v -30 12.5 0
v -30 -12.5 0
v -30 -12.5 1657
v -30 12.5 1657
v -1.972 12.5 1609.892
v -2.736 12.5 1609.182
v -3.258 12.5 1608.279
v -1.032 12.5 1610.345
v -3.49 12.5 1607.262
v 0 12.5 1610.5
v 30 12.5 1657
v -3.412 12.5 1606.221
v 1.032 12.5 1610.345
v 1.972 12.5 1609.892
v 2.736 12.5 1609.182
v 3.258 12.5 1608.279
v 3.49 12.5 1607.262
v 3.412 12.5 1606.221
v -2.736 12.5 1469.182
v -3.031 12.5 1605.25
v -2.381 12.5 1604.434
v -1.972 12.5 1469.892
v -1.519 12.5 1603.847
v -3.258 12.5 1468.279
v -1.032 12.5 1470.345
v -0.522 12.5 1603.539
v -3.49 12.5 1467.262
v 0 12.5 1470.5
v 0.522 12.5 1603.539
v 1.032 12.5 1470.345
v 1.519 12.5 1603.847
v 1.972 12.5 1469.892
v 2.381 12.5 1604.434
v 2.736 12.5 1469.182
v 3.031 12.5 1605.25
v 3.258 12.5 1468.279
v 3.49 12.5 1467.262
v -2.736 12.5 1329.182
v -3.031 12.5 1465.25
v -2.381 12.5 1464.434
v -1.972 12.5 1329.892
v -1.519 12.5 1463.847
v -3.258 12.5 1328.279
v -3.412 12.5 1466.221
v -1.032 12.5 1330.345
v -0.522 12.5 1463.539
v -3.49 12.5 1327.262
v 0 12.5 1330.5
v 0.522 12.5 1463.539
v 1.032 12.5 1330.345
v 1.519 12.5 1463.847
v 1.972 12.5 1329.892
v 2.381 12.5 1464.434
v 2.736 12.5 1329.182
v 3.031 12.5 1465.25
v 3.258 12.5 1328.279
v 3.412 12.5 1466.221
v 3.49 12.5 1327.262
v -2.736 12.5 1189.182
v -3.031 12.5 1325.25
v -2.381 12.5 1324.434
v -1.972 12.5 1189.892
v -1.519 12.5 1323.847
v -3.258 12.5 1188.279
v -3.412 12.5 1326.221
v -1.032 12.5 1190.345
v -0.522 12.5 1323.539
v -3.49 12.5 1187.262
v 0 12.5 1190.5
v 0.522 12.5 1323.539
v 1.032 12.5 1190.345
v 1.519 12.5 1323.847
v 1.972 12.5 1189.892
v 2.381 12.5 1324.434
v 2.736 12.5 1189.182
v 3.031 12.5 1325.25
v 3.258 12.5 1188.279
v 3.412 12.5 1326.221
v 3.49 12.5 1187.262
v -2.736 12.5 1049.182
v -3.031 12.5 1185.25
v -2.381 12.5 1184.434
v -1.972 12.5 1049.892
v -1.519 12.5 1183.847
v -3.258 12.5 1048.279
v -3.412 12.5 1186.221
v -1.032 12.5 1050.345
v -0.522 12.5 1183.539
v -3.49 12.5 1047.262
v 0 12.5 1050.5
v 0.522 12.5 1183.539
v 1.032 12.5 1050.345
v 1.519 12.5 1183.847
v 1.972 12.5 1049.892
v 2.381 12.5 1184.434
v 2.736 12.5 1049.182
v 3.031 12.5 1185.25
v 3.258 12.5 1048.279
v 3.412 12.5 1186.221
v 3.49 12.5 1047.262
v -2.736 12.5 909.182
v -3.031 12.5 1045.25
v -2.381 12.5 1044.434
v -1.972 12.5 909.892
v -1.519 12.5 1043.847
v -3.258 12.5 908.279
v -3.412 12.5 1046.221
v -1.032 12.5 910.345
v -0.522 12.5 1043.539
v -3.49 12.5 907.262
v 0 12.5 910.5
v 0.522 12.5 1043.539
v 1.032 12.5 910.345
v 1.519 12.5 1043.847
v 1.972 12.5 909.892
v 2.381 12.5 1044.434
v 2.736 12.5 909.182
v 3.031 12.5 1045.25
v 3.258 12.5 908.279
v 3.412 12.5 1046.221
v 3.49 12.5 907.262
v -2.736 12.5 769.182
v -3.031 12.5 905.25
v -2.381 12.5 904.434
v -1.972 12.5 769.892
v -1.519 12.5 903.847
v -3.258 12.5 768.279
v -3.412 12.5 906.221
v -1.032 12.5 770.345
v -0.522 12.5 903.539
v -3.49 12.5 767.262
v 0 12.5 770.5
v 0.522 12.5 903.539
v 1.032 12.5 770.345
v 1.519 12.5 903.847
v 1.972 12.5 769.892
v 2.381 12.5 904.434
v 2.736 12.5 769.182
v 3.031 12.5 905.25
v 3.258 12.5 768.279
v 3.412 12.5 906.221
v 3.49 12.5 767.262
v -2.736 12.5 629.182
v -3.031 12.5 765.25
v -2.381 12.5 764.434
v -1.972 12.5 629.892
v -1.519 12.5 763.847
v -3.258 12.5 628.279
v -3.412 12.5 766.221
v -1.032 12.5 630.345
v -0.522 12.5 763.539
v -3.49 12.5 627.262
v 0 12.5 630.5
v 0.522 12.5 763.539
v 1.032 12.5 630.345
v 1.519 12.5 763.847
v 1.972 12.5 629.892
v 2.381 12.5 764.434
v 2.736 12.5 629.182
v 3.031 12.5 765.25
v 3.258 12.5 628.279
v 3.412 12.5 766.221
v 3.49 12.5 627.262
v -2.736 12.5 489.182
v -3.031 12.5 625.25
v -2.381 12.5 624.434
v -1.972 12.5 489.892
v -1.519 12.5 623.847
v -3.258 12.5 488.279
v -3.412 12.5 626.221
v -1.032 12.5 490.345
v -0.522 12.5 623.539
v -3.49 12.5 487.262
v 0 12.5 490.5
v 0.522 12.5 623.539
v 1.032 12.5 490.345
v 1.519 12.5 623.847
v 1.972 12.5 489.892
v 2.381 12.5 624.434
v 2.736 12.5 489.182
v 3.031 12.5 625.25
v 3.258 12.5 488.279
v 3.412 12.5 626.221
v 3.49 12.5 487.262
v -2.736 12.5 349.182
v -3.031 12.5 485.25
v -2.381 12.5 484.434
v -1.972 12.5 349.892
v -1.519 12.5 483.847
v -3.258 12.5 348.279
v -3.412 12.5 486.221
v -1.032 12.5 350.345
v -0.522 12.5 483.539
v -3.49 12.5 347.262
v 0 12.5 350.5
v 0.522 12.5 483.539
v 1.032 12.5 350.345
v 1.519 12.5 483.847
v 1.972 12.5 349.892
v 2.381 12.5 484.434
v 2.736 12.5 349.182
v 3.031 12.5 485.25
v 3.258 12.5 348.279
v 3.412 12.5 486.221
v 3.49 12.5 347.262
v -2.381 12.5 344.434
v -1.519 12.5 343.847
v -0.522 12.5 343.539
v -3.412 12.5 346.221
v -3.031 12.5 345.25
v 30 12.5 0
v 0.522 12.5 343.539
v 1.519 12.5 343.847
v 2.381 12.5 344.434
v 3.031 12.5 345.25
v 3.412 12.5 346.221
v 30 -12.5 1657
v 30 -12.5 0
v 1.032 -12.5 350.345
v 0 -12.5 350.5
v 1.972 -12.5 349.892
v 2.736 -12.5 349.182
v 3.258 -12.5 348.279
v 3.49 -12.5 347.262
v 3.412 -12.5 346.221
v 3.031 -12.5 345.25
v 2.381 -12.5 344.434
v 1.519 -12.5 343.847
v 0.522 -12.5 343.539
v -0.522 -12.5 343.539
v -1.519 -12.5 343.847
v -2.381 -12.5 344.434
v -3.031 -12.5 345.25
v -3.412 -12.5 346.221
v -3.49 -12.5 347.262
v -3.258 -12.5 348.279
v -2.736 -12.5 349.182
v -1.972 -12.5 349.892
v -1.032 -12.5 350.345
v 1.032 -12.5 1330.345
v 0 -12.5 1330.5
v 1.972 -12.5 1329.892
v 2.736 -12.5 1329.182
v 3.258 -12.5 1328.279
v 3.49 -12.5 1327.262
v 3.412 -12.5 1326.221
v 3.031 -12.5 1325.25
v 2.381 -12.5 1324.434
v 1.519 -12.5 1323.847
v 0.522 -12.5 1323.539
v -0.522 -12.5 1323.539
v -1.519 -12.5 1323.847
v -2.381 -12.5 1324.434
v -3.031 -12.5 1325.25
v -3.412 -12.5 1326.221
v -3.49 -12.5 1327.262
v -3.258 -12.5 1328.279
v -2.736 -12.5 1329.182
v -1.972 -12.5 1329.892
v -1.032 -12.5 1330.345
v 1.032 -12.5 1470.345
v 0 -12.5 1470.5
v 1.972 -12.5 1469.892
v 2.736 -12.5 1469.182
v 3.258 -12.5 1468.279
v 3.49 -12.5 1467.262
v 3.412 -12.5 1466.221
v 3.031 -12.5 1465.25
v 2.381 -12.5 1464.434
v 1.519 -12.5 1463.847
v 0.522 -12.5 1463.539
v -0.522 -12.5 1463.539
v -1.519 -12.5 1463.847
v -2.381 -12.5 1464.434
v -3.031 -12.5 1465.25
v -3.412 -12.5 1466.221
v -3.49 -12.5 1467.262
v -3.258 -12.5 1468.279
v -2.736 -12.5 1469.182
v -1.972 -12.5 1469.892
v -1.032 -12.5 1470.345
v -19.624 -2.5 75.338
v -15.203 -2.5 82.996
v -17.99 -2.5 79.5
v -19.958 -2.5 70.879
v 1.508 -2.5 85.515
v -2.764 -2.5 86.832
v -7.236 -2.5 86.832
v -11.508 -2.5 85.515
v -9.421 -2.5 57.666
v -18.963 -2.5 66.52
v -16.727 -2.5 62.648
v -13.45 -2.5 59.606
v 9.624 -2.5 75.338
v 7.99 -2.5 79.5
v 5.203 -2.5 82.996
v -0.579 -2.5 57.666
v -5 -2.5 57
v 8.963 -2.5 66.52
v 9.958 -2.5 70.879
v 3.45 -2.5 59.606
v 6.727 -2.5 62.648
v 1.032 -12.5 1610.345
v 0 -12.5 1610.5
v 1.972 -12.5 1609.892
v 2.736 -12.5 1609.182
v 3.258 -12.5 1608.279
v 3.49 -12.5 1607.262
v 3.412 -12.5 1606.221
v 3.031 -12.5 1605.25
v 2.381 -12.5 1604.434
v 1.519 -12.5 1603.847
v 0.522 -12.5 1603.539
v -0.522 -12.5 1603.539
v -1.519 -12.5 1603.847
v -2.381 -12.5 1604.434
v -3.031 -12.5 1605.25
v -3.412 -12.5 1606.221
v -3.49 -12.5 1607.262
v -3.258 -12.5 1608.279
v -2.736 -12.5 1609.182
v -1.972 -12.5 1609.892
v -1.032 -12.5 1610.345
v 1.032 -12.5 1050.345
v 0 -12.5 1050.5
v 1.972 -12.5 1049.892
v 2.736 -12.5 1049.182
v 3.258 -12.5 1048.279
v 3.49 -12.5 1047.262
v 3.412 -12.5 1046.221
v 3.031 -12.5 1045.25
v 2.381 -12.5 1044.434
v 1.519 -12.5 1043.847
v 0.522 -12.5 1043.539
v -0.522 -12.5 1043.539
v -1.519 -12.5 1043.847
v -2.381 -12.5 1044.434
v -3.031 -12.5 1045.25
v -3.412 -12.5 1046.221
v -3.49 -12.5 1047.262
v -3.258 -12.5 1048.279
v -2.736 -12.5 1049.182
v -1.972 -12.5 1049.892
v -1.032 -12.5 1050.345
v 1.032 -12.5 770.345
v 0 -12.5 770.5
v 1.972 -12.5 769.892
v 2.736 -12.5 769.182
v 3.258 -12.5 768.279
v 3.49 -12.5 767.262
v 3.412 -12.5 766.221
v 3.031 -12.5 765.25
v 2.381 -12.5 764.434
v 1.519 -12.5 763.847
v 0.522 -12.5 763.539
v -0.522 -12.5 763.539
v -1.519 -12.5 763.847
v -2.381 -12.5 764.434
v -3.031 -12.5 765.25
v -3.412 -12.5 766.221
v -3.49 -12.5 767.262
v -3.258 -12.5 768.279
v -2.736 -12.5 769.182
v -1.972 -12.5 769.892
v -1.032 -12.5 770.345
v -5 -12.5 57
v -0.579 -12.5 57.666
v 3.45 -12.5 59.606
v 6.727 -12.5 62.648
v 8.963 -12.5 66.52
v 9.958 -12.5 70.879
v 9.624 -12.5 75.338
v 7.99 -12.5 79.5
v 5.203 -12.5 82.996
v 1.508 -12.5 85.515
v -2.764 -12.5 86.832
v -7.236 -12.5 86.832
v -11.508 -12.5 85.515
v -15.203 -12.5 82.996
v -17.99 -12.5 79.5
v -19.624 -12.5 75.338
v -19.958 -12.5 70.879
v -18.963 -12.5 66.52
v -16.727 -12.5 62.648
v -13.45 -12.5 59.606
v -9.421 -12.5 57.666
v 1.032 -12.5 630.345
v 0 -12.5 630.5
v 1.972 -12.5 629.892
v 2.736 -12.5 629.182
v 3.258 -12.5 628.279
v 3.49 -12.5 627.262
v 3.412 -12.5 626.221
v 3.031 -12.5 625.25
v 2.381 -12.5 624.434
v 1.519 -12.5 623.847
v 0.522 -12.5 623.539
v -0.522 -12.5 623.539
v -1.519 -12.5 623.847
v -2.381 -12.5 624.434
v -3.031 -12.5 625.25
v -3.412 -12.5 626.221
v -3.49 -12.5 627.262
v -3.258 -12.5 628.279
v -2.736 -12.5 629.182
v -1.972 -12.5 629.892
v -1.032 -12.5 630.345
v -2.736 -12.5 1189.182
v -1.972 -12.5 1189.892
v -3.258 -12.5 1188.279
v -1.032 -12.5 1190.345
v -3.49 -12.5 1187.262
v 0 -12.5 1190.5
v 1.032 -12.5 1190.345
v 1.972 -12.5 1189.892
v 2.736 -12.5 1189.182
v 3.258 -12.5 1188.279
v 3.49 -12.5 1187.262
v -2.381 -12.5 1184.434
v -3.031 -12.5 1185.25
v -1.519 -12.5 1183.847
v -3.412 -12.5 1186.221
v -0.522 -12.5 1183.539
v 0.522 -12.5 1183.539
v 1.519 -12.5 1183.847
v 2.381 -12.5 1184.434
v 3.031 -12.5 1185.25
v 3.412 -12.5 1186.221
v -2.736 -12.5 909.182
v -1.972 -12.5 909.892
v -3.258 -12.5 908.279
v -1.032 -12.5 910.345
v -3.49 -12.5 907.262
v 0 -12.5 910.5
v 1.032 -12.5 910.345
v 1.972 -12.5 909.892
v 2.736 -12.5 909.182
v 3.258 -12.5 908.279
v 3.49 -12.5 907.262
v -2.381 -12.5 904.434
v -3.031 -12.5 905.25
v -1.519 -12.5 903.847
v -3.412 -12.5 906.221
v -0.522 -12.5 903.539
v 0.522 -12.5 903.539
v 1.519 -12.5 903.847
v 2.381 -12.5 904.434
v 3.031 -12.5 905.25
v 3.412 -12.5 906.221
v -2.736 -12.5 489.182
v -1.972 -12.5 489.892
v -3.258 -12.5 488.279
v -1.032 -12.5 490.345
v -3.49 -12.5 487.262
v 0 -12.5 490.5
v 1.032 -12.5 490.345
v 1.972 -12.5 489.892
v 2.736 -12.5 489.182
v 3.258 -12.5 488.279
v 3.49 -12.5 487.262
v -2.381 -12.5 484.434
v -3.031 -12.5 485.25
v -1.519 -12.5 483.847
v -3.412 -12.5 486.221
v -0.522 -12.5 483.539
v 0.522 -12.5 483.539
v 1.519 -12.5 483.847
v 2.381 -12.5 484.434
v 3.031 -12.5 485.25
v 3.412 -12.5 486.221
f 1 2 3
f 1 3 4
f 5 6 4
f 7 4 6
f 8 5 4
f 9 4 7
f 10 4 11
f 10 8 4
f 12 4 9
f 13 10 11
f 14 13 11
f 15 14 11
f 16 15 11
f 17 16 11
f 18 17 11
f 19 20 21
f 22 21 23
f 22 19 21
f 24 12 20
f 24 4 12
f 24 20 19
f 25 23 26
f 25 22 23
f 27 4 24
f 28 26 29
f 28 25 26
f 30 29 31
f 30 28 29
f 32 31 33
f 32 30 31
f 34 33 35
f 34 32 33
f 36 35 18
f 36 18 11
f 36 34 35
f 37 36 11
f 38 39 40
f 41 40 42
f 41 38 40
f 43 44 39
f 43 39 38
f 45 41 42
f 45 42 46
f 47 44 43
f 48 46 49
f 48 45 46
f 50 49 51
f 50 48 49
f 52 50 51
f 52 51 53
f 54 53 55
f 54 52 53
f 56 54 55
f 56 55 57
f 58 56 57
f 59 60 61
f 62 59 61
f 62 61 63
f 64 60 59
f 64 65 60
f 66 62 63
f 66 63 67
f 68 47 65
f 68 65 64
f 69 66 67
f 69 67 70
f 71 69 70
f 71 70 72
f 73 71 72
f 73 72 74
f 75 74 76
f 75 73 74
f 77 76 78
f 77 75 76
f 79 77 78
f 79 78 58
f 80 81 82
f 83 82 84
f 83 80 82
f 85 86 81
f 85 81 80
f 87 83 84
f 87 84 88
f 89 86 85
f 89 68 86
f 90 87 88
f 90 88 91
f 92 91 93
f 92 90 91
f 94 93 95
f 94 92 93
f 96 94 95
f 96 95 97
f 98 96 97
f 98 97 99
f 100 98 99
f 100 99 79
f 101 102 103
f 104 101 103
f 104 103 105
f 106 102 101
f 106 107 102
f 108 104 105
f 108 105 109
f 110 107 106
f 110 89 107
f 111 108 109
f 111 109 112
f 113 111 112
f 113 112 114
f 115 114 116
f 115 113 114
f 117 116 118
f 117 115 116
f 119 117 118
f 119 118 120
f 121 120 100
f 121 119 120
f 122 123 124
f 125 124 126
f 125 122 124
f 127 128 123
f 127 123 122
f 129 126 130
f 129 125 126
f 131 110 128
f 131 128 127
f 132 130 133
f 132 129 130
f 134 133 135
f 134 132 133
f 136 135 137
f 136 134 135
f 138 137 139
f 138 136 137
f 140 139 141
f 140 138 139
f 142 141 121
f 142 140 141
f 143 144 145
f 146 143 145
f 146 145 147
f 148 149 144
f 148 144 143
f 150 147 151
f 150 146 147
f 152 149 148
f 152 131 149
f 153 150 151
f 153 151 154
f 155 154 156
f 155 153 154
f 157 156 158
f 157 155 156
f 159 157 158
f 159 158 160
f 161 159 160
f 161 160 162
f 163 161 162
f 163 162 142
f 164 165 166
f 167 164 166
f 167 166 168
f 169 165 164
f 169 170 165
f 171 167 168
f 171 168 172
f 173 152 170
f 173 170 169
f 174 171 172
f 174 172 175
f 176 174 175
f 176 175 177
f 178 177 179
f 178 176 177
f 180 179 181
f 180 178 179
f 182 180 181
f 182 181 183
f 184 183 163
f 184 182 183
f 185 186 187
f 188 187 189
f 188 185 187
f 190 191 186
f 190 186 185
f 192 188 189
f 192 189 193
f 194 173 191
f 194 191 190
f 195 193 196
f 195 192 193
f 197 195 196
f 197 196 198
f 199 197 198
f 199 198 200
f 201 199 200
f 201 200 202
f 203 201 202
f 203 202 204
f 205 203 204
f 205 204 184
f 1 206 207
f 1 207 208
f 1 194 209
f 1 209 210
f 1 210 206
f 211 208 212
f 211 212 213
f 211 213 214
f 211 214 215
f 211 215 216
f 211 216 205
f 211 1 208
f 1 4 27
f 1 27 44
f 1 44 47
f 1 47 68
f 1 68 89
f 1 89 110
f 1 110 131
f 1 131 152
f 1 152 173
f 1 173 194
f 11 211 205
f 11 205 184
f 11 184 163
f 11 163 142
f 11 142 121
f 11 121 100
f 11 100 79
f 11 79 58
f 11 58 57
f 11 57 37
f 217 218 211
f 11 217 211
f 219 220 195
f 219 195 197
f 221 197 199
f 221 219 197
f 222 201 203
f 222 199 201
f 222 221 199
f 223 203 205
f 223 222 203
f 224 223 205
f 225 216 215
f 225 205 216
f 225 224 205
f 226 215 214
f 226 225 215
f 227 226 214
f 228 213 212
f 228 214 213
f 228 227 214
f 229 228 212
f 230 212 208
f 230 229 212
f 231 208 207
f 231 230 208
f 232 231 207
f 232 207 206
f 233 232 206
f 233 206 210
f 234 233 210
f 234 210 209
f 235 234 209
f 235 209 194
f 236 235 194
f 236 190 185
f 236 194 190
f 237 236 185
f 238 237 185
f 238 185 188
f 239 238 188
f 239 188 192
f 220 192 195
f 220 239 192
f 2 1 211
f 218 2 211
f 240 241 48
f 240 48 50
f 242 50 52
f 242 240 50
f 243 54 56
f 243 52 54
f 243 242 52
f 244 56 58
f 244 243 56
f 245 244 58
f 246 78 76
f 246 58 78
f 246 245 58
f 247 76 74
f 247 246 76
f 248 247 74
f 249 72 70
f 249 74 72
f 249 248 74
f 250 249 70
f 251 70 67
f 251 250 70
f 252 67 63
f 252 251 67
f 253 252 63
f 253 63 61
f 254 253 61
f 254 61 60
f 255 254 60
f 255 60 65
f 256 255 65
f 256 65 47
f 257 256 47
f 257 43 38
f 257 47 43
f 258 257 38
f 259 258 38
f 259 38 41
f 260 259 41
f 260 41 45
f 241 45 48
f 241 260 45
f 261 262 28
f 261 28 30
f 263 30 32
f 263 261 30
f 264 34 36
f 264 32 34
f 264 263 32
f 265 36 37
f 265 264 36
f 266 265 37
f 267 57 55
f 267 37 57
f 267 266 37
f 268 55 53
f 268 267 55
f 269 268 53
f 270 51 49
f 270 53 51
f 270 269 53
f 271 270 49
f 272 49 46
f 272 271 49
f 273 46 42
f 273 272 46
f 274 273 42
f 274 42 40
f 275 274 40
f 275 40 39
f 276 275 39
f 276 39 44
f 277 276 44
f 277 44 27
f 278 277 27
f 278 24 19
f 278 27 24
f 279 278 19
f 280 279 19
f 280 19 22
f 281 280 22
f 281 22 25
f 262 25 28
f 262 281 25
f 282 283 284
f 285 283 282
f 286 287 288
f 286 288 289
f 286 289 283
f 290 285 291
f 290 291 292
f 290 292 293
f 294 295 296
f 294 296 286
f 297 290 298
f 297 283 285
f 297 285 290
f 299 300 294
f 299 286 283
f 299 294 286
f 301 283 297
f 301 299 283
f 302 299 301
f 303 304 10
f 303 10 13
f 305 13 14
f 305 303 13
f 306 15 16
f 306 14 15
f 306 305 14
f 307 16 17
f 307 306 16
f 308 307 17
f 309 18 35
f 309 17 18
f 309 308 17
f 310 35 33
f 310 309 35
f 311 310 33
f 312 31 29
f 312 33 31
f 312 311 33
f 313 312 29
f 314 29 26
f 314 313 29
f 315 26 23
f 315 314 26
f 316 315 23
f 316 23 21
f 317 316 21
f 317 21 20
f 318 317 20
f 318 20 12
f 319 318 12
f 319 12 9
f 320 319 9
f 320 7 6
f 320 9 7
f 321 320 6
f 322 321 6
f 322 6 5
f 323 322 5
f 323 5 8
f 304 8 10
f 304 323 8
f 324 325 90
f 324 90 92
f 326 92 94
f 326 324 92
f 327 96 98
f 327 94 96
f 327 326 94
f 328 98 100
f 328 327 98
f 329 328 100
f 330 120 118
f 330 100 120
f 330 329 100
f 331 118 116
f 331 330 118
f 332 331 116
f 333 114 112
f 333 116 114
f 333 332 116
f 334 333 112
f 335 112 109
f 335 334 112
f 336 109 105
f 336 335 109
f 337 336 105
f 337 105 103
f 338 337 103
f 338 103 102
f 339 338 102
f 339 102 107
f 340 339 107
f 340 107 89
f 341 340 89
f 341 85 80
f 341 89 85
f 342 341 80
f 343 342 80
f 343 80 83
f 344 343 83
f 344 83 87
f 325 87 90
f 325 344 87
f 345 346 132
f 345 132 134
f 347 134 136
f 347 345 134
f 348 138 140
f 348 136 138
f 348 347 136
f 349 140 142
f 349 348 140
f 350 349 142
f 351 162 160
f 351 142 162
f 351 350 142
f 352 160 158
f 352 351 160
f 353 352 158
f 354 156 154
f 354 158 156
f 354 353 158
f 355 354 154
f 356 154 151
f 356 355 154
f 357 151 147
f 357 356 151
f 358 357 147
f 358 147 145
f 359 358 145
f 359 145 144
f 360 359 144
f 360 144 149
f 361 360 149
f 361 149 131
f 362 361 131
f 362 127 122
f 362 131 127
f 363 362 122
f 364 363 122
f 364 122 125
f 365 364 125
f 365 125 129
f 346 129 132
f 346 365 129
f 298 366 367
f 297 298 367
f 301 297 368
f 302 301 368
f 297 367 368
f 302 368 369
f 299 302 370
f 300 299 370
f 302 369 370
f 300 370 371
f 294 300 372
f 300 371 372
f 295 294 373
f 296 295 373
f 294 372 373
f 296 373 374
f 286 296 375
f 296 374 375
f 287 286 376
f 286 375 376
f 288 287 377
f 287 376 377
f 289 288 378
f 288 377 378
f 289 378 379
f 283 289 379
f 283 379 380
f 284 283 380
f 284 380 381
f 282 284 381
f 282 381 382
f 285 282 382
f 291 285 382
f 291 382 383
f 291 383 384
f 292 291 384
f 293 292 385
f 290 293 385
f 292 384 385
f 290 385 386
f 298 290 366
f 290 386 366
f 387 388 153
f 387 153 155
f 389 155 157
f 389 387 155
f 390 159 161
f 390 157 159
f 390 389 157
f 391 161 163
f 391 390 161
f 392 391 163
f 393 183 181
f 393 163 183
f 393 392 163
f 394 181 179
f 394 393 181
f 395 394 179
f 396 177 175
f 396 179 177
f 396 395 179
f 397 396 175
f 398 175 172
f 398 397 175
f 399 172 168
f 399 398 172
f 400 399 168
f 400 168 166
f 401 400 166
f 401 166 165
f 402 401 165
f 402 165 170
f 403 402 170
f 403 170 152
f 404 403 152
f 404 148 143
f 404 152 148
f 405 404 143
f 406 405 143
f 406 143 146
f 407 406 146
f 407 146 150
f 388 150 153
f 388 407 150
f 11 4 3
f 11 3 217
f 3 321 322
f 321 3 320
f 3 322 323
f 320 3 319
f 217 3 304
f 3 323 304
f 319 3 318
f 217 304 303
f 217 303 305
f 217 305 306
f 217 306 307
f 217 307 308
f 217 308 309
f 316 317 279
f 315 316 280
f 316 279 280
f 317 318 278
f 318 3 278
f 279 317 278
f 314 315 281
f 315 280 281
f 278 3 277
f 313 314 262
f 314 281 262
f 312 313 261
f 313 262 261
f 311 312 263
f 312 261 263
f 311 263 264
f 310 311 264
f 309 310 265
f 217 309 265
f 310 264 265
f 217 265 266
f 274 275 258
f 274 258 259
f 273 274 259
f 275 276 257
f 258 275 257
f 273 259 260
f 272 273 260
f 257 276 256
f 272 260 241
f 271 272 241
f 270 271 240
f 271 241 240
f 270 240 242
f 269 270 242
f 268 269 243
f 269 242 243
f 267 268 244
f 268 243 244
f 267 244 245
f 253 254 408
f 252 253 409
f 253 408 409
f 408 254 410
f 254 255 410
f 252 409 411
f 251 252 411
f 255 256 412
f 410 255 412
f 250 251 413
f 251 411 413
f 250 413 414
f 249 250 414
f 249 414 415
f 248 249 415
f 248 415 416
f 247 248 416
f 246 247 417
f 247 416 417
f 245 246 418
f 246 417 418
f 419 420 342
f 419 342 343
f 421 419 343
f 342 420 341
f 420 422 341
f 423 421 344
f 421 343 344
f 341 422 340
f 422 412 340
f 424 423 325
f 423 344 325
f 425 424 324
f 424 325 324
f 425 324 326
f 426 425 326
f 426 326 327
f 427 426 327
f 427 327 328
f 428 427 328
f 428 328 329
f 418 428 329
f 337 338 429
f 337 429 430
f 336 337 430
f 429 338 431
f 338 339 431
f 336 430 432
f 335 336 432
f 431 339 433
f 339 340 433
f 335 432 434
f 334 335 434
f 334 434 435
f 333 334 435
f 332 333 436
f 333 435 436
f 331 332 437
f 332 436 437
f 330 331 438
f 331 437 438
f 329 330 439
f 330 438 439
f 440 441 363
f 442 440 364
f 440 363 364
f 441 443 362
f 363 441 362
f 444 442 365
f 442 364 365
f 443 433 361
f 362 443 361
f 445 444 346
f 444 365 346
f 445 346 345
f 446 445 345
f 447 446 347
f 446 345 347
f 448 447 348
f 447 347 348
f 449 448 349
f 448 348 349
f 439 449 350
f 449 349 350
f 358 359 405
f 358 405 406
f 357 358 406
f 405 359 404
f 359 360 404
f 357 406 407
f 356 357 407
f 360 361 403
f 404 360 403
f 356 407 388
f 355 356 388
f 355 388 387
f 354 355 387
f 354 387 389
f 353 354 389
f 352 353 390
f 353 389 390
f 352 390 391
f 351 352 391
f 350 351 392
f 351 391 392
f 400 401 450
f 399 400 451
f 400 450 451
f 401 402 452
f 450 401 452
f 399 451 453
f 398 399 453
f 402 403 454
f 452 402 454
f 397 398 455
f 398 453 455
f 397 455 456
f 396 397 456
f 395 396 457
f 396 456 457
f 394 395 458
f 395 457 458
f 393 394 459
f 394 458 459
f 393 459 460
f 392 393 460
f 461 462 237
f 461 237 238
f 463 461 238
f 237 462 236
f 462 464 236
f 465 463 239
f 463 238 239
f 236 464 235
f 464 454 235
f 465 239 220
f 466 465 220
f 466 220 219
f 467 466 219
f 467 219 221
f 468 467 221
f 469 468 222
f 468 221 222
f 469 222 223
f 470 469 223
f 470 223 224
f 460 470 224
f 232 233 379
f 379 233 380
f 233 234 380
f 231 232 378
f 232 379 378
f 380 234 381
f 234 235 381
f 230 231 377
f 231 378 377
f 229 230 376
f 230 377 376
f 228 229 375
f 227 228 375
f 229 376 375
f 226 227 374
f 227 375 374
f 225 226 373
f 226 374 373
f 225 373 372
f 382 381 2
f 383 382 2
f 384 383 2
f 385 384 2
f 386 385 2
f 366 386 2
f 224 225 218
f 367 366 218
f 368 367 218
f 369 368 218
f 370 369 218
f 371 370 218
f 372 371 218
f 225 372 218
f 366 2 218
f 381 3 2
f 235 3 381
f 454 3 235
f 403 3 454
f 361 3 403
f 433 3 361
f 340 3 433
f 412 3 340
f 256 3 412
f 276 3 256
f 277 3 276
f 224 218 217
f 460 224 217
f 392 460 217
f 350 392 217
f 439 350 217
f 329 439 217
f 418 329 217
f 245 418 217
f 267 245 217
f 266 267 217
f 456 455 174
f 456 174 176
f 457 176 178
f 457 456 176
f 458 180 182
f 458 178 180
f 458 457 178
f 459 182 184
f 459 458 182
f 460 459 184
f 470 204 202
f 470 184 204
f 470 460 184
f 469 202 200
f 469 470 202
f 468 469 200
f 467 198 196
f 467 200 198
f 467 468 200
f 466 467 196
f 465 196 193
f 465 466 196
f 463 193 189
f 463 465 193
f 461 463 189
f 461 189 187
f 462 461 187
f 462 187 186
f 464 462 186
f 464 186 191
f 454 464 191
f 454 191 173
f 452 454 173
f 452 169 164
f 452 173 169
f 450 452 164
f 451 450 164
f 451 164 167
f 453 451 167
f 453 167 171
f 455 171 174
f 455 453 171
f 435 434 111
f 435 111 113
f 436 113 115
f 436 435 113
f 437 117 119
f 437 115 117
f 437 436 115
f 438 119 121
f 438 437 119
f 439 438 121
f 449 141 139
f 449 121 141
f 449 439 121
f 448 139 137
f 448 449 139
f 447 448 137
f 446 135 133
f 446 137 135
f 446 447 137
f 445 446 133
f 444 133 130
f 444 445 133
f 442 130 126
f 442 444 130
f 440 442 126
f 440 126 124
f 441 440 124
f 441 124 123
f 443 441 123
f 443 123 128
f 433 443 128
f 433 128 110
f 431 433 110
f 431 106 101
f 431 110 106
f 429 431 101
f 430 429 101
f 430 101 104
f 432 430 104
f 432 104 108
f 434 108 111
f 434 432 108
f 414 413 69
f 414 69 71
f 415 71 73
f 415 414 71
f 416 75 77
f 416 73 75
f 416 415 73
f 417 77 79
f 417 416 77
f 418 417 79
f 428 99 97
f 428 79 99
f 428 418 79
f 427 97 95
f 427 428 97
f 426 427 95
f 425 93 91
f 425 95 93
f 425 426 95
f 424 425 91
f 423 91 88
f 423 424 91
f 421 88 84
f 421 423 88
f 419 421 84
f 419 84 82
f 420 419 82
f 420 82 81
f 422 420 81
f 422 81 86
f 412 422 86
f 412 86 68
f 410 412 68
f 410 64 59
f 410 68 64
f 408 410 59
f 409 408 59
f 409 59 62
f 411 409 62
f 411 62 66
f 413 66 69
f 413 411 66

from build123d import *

# Parameters (mm, degrees)
SKETCH_1_W               = 60
SKETCH_1_H               = 25
EXTRUDE_1_DEPTH          = 1657
SKETCH_2_R               = 15
CUT_EXTRUDE_1_DEPTH      = 10
CUT_EXTRUDE_2_DEPTH      = 1658.460105101
CUT_EXTRUDE_2_DEPTH_BACK = 1658.460105101
SKETCH_3_R               = 3.5


with BuildPart() as part:
    # Эскиз1 → Бобышка-Вытянуть1 (new body)
    with BuildSketch(Plane.XY):
        Rectangle(SKETCH_1_W, SKETCH_1_H)
    extrude(amount=EXTRUDE_1_DEPTH)

    # Эскиз2 → Вырез-Вытянуть1 (cut)
    with BuildSketch(Plane.XZ.offset(12.5)):
        with Locations(Location((-5, 72, 0), (0, 0, 270))):
            Circle(SKETCH_2_R)
    extrude(amount=-CUT_EXTRUDE_1_DEPTH, mode=Mode.SUBTRACT)

    # Эскиз3 → Вырез-Вытянуть2 (cut, two sides: drawn at the far end of the back side and taken through both)
    with BuildSketch(Plane(origin=(0, 12.5, 0), x_dir=(1, 0, 0), z_dir=(0, 1, 0)).offset(-CUT_EXTRUDE_2_DEPTH_BACK)):
        with Locations(Location((0, -1607, 0), (0, 0, 270))):
            Circle(SKETCH_3_R)
        with Locations(Location((0, -1467, 0), (0, 0, 270))):
            Circle(SKETCH_3_R)
        with Locations(Location((0, -1327, 0), (0, 0, 270))):
            Circle(SKETCH_3_R)
        with Locations(Location((0, -1187, 0), (0, 0, 270))):
            Circle(SKETCH_3_R)
        with Locations(Location((0, -1047, 0), (0, 0, 270))):
            Circle(SKETCH_3_R)
        with Locations(Location((0, -907, 0), (0, 0, 270))):
            Circle(SKETCH_3_R)
        with Locations(Location((0, -767, 0), (0, 0, 270))):
            Circle(SKETCH_3_R)
        with Locations(Location((0, -627, 0), (0, 0, 270))):
            Circle(SKETCH_3_R)
        with Locations(Location((0, -487, 0), (0, 0, 270))):
            Circle(SKETCH_3_R)
        with Locations(Location((0, -347, 0), (0, 0, 270))):
            Circle(SKETCH_3_R)
    extrude(amount=CUT_EXTRUDE_2_DEPTH + CUT_EXTRUDE_2_DEPTH_BACK, mode=Mode.SUBTRACT)


solid = part.part
